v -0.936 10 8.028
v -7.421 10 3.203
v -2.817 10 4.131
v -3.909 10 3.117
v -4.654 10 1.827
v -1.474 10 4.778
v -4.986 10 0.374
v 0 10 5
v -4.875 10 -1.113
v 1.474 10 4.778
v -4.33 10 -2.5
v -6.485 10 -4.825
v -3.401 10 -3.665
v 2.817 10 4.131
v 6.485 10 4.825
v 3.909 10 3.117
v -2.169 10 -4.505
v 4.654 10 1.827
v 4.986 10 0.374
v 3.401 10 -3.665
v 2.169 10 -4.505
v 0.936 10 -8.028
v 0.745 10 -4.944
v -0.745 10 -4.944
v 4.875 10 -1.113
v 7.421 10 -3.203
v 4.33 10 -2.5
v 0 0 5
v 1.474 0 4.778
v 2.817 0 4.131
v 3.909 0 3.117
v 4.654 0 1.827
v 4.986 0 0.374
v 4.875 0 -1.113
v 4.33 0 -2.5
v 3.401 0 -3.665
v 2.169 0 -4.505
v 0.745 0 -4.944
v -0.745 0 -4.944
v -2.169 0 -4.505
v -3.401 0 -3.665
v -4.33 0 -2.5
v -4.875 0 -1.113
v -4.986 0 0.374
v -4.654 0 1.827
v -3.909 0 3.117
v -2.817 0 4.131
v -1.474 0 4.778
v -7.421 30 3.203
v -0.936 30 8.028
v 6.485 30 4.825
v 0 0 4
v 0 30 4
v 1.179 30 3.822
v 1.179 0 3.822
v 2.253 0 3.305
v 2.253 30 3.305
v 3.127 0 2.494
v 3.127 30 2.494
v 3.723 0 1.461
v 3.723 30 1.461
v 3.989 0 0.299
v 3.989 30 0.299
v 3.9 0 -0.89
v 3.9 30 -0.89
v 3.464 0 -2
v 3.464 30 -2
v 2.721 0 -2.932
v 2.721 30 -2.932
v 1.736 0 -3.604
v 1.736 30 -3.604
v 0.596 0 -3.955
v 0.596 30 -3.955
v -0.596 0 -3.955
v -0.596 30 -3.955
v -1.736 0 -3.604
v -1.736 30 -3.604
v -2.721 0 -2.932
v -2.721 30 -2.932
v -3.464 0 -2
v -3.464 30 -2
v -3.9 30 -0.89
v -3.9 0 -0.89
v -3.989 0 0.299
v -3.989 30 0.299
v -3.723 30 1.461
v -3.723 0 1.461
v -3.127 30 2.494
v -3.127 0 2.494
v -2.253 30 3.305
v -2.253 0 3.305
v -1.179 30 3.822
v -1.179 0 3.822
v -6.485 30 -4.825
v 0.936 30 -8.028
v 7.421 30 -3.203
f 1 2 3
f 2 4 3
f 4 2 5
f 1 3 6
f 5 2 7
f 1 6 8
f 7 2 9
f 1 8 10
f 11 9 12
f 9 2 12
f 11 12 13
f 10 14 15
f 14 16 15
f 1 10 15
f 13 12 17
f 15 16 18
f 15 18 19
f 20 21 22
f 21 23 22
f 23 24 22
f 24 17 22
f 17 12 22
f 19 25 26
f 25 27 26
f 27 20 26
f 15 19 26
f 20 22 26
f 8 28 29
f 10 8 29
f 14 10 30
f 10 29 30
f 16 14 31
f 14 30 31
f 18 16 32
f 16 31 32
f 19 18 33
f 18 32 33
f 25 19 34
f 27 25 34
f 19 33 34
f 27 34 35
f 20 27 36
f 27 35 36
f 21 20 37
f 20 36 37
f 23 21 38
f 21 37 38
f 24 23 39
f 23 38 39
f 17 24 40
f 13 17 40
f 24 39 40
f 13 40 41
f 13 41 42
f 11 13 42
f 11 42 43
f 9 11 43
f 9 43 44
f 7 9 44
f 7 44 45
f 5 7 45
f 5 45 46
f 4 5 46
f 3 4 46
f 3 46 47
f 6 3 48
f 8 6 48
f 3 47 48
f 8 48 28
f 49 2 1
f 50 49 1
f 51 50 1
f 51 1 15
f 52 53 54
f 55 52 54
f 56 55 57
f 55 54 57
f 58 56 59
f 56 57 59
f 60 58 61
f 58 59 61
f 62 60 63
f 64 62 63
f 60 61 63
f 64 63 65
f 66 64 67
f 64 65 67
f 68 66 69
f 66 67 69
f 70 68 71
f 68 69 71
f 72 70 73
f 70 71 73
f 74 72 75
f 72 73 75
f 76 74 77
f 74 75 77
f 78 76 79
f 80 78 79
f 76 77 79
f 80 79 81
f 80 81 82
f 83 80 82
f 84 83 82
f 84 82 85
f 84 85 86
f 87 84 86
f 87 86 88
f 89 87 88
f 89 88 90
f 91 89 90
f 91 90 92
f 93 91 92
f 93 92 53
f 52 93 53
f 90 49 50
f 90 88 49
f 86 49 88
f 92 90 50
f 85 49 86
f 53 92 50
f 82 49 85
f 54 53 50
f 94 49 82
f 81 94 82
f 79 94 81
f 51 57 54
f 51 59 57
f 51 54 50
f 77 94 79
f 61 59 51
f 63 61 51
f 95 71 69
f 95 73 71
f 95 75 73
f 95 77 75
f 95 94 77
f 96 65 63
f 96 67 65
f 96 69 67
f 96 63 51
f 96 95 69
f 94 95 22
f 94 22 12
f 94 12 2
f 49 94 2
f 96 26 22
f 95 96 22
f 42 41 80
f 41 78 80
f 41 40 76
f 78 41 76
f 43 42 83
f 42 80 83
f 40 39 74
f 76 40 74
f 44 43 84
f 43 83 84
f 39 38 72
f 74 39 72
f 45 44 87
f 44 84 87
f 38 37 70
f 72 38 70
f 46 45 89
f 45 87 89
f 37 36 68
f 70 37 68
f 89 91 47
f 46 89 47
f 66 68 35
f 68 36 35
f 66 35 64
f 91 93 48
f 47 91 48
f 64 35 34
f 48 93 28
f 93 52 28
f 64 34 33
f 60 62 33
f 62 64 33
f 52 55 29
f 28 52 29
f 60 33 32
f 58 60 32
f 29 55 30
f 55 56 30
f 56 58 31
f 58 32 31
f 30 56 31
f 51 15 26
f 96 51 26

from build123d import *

# Parameters (mm, degrees)
SKETCH_1_R          = 5
EXTRUDE_1_DEPTH     = 10
EXTRUDE_2_DEPTH     = 20
SKETCH_3_R          = 4
CUT_EXTRUDE_1_DEPTH = 32.930052519


with BuildPart() as part:
    # 草图1 → 凸台-拉伸1 (new body)
    with BuildSketch(Plane(origin=(0, 0, 0), x_dir=(1, 0, 0), z_dir=(0, 1, 0))):
        with Locations(Location((0, 0, 0), (0, 0, 270))):
            Circle(SKETCH_1_R)
    extrude(amount=EXTRUDE_1_DEPTH)

    # 草图2 → 凸台-拉伸2 (add)
    with BuildSketch(Plane(origin=(0, 10, 0), x_dir=(1, 0, 0), z_dir=(0, 1, 0))):
        Polygon((7.421020472, 3.203402641), (0.93628217, 8.028493572), (-6.484738302, 4.82509093), (-7.421020472, -3.203402641), (-0.93628217, -8.028493572), (6.484738302, -4.82509093), align=None)
    extrude(amount=EXTRUDE_2_DEPTH)

    # 草图3 → 切除-拉伸1 (cut, through all)
    with BuildSketch(Plane(origin=(0, 30, 0), x_dir=(1, 0, 0), z_dir=(0, 1, 0))):
        with Locations(Location((0, 0, 0), (0, 0, 270))):
            Circle(SKETCH_3_R)
    extrude(amount=-CUT_EXTRUDE_1_DEPTH, mode=Mode.SUBTRACT)


solid = part.part
